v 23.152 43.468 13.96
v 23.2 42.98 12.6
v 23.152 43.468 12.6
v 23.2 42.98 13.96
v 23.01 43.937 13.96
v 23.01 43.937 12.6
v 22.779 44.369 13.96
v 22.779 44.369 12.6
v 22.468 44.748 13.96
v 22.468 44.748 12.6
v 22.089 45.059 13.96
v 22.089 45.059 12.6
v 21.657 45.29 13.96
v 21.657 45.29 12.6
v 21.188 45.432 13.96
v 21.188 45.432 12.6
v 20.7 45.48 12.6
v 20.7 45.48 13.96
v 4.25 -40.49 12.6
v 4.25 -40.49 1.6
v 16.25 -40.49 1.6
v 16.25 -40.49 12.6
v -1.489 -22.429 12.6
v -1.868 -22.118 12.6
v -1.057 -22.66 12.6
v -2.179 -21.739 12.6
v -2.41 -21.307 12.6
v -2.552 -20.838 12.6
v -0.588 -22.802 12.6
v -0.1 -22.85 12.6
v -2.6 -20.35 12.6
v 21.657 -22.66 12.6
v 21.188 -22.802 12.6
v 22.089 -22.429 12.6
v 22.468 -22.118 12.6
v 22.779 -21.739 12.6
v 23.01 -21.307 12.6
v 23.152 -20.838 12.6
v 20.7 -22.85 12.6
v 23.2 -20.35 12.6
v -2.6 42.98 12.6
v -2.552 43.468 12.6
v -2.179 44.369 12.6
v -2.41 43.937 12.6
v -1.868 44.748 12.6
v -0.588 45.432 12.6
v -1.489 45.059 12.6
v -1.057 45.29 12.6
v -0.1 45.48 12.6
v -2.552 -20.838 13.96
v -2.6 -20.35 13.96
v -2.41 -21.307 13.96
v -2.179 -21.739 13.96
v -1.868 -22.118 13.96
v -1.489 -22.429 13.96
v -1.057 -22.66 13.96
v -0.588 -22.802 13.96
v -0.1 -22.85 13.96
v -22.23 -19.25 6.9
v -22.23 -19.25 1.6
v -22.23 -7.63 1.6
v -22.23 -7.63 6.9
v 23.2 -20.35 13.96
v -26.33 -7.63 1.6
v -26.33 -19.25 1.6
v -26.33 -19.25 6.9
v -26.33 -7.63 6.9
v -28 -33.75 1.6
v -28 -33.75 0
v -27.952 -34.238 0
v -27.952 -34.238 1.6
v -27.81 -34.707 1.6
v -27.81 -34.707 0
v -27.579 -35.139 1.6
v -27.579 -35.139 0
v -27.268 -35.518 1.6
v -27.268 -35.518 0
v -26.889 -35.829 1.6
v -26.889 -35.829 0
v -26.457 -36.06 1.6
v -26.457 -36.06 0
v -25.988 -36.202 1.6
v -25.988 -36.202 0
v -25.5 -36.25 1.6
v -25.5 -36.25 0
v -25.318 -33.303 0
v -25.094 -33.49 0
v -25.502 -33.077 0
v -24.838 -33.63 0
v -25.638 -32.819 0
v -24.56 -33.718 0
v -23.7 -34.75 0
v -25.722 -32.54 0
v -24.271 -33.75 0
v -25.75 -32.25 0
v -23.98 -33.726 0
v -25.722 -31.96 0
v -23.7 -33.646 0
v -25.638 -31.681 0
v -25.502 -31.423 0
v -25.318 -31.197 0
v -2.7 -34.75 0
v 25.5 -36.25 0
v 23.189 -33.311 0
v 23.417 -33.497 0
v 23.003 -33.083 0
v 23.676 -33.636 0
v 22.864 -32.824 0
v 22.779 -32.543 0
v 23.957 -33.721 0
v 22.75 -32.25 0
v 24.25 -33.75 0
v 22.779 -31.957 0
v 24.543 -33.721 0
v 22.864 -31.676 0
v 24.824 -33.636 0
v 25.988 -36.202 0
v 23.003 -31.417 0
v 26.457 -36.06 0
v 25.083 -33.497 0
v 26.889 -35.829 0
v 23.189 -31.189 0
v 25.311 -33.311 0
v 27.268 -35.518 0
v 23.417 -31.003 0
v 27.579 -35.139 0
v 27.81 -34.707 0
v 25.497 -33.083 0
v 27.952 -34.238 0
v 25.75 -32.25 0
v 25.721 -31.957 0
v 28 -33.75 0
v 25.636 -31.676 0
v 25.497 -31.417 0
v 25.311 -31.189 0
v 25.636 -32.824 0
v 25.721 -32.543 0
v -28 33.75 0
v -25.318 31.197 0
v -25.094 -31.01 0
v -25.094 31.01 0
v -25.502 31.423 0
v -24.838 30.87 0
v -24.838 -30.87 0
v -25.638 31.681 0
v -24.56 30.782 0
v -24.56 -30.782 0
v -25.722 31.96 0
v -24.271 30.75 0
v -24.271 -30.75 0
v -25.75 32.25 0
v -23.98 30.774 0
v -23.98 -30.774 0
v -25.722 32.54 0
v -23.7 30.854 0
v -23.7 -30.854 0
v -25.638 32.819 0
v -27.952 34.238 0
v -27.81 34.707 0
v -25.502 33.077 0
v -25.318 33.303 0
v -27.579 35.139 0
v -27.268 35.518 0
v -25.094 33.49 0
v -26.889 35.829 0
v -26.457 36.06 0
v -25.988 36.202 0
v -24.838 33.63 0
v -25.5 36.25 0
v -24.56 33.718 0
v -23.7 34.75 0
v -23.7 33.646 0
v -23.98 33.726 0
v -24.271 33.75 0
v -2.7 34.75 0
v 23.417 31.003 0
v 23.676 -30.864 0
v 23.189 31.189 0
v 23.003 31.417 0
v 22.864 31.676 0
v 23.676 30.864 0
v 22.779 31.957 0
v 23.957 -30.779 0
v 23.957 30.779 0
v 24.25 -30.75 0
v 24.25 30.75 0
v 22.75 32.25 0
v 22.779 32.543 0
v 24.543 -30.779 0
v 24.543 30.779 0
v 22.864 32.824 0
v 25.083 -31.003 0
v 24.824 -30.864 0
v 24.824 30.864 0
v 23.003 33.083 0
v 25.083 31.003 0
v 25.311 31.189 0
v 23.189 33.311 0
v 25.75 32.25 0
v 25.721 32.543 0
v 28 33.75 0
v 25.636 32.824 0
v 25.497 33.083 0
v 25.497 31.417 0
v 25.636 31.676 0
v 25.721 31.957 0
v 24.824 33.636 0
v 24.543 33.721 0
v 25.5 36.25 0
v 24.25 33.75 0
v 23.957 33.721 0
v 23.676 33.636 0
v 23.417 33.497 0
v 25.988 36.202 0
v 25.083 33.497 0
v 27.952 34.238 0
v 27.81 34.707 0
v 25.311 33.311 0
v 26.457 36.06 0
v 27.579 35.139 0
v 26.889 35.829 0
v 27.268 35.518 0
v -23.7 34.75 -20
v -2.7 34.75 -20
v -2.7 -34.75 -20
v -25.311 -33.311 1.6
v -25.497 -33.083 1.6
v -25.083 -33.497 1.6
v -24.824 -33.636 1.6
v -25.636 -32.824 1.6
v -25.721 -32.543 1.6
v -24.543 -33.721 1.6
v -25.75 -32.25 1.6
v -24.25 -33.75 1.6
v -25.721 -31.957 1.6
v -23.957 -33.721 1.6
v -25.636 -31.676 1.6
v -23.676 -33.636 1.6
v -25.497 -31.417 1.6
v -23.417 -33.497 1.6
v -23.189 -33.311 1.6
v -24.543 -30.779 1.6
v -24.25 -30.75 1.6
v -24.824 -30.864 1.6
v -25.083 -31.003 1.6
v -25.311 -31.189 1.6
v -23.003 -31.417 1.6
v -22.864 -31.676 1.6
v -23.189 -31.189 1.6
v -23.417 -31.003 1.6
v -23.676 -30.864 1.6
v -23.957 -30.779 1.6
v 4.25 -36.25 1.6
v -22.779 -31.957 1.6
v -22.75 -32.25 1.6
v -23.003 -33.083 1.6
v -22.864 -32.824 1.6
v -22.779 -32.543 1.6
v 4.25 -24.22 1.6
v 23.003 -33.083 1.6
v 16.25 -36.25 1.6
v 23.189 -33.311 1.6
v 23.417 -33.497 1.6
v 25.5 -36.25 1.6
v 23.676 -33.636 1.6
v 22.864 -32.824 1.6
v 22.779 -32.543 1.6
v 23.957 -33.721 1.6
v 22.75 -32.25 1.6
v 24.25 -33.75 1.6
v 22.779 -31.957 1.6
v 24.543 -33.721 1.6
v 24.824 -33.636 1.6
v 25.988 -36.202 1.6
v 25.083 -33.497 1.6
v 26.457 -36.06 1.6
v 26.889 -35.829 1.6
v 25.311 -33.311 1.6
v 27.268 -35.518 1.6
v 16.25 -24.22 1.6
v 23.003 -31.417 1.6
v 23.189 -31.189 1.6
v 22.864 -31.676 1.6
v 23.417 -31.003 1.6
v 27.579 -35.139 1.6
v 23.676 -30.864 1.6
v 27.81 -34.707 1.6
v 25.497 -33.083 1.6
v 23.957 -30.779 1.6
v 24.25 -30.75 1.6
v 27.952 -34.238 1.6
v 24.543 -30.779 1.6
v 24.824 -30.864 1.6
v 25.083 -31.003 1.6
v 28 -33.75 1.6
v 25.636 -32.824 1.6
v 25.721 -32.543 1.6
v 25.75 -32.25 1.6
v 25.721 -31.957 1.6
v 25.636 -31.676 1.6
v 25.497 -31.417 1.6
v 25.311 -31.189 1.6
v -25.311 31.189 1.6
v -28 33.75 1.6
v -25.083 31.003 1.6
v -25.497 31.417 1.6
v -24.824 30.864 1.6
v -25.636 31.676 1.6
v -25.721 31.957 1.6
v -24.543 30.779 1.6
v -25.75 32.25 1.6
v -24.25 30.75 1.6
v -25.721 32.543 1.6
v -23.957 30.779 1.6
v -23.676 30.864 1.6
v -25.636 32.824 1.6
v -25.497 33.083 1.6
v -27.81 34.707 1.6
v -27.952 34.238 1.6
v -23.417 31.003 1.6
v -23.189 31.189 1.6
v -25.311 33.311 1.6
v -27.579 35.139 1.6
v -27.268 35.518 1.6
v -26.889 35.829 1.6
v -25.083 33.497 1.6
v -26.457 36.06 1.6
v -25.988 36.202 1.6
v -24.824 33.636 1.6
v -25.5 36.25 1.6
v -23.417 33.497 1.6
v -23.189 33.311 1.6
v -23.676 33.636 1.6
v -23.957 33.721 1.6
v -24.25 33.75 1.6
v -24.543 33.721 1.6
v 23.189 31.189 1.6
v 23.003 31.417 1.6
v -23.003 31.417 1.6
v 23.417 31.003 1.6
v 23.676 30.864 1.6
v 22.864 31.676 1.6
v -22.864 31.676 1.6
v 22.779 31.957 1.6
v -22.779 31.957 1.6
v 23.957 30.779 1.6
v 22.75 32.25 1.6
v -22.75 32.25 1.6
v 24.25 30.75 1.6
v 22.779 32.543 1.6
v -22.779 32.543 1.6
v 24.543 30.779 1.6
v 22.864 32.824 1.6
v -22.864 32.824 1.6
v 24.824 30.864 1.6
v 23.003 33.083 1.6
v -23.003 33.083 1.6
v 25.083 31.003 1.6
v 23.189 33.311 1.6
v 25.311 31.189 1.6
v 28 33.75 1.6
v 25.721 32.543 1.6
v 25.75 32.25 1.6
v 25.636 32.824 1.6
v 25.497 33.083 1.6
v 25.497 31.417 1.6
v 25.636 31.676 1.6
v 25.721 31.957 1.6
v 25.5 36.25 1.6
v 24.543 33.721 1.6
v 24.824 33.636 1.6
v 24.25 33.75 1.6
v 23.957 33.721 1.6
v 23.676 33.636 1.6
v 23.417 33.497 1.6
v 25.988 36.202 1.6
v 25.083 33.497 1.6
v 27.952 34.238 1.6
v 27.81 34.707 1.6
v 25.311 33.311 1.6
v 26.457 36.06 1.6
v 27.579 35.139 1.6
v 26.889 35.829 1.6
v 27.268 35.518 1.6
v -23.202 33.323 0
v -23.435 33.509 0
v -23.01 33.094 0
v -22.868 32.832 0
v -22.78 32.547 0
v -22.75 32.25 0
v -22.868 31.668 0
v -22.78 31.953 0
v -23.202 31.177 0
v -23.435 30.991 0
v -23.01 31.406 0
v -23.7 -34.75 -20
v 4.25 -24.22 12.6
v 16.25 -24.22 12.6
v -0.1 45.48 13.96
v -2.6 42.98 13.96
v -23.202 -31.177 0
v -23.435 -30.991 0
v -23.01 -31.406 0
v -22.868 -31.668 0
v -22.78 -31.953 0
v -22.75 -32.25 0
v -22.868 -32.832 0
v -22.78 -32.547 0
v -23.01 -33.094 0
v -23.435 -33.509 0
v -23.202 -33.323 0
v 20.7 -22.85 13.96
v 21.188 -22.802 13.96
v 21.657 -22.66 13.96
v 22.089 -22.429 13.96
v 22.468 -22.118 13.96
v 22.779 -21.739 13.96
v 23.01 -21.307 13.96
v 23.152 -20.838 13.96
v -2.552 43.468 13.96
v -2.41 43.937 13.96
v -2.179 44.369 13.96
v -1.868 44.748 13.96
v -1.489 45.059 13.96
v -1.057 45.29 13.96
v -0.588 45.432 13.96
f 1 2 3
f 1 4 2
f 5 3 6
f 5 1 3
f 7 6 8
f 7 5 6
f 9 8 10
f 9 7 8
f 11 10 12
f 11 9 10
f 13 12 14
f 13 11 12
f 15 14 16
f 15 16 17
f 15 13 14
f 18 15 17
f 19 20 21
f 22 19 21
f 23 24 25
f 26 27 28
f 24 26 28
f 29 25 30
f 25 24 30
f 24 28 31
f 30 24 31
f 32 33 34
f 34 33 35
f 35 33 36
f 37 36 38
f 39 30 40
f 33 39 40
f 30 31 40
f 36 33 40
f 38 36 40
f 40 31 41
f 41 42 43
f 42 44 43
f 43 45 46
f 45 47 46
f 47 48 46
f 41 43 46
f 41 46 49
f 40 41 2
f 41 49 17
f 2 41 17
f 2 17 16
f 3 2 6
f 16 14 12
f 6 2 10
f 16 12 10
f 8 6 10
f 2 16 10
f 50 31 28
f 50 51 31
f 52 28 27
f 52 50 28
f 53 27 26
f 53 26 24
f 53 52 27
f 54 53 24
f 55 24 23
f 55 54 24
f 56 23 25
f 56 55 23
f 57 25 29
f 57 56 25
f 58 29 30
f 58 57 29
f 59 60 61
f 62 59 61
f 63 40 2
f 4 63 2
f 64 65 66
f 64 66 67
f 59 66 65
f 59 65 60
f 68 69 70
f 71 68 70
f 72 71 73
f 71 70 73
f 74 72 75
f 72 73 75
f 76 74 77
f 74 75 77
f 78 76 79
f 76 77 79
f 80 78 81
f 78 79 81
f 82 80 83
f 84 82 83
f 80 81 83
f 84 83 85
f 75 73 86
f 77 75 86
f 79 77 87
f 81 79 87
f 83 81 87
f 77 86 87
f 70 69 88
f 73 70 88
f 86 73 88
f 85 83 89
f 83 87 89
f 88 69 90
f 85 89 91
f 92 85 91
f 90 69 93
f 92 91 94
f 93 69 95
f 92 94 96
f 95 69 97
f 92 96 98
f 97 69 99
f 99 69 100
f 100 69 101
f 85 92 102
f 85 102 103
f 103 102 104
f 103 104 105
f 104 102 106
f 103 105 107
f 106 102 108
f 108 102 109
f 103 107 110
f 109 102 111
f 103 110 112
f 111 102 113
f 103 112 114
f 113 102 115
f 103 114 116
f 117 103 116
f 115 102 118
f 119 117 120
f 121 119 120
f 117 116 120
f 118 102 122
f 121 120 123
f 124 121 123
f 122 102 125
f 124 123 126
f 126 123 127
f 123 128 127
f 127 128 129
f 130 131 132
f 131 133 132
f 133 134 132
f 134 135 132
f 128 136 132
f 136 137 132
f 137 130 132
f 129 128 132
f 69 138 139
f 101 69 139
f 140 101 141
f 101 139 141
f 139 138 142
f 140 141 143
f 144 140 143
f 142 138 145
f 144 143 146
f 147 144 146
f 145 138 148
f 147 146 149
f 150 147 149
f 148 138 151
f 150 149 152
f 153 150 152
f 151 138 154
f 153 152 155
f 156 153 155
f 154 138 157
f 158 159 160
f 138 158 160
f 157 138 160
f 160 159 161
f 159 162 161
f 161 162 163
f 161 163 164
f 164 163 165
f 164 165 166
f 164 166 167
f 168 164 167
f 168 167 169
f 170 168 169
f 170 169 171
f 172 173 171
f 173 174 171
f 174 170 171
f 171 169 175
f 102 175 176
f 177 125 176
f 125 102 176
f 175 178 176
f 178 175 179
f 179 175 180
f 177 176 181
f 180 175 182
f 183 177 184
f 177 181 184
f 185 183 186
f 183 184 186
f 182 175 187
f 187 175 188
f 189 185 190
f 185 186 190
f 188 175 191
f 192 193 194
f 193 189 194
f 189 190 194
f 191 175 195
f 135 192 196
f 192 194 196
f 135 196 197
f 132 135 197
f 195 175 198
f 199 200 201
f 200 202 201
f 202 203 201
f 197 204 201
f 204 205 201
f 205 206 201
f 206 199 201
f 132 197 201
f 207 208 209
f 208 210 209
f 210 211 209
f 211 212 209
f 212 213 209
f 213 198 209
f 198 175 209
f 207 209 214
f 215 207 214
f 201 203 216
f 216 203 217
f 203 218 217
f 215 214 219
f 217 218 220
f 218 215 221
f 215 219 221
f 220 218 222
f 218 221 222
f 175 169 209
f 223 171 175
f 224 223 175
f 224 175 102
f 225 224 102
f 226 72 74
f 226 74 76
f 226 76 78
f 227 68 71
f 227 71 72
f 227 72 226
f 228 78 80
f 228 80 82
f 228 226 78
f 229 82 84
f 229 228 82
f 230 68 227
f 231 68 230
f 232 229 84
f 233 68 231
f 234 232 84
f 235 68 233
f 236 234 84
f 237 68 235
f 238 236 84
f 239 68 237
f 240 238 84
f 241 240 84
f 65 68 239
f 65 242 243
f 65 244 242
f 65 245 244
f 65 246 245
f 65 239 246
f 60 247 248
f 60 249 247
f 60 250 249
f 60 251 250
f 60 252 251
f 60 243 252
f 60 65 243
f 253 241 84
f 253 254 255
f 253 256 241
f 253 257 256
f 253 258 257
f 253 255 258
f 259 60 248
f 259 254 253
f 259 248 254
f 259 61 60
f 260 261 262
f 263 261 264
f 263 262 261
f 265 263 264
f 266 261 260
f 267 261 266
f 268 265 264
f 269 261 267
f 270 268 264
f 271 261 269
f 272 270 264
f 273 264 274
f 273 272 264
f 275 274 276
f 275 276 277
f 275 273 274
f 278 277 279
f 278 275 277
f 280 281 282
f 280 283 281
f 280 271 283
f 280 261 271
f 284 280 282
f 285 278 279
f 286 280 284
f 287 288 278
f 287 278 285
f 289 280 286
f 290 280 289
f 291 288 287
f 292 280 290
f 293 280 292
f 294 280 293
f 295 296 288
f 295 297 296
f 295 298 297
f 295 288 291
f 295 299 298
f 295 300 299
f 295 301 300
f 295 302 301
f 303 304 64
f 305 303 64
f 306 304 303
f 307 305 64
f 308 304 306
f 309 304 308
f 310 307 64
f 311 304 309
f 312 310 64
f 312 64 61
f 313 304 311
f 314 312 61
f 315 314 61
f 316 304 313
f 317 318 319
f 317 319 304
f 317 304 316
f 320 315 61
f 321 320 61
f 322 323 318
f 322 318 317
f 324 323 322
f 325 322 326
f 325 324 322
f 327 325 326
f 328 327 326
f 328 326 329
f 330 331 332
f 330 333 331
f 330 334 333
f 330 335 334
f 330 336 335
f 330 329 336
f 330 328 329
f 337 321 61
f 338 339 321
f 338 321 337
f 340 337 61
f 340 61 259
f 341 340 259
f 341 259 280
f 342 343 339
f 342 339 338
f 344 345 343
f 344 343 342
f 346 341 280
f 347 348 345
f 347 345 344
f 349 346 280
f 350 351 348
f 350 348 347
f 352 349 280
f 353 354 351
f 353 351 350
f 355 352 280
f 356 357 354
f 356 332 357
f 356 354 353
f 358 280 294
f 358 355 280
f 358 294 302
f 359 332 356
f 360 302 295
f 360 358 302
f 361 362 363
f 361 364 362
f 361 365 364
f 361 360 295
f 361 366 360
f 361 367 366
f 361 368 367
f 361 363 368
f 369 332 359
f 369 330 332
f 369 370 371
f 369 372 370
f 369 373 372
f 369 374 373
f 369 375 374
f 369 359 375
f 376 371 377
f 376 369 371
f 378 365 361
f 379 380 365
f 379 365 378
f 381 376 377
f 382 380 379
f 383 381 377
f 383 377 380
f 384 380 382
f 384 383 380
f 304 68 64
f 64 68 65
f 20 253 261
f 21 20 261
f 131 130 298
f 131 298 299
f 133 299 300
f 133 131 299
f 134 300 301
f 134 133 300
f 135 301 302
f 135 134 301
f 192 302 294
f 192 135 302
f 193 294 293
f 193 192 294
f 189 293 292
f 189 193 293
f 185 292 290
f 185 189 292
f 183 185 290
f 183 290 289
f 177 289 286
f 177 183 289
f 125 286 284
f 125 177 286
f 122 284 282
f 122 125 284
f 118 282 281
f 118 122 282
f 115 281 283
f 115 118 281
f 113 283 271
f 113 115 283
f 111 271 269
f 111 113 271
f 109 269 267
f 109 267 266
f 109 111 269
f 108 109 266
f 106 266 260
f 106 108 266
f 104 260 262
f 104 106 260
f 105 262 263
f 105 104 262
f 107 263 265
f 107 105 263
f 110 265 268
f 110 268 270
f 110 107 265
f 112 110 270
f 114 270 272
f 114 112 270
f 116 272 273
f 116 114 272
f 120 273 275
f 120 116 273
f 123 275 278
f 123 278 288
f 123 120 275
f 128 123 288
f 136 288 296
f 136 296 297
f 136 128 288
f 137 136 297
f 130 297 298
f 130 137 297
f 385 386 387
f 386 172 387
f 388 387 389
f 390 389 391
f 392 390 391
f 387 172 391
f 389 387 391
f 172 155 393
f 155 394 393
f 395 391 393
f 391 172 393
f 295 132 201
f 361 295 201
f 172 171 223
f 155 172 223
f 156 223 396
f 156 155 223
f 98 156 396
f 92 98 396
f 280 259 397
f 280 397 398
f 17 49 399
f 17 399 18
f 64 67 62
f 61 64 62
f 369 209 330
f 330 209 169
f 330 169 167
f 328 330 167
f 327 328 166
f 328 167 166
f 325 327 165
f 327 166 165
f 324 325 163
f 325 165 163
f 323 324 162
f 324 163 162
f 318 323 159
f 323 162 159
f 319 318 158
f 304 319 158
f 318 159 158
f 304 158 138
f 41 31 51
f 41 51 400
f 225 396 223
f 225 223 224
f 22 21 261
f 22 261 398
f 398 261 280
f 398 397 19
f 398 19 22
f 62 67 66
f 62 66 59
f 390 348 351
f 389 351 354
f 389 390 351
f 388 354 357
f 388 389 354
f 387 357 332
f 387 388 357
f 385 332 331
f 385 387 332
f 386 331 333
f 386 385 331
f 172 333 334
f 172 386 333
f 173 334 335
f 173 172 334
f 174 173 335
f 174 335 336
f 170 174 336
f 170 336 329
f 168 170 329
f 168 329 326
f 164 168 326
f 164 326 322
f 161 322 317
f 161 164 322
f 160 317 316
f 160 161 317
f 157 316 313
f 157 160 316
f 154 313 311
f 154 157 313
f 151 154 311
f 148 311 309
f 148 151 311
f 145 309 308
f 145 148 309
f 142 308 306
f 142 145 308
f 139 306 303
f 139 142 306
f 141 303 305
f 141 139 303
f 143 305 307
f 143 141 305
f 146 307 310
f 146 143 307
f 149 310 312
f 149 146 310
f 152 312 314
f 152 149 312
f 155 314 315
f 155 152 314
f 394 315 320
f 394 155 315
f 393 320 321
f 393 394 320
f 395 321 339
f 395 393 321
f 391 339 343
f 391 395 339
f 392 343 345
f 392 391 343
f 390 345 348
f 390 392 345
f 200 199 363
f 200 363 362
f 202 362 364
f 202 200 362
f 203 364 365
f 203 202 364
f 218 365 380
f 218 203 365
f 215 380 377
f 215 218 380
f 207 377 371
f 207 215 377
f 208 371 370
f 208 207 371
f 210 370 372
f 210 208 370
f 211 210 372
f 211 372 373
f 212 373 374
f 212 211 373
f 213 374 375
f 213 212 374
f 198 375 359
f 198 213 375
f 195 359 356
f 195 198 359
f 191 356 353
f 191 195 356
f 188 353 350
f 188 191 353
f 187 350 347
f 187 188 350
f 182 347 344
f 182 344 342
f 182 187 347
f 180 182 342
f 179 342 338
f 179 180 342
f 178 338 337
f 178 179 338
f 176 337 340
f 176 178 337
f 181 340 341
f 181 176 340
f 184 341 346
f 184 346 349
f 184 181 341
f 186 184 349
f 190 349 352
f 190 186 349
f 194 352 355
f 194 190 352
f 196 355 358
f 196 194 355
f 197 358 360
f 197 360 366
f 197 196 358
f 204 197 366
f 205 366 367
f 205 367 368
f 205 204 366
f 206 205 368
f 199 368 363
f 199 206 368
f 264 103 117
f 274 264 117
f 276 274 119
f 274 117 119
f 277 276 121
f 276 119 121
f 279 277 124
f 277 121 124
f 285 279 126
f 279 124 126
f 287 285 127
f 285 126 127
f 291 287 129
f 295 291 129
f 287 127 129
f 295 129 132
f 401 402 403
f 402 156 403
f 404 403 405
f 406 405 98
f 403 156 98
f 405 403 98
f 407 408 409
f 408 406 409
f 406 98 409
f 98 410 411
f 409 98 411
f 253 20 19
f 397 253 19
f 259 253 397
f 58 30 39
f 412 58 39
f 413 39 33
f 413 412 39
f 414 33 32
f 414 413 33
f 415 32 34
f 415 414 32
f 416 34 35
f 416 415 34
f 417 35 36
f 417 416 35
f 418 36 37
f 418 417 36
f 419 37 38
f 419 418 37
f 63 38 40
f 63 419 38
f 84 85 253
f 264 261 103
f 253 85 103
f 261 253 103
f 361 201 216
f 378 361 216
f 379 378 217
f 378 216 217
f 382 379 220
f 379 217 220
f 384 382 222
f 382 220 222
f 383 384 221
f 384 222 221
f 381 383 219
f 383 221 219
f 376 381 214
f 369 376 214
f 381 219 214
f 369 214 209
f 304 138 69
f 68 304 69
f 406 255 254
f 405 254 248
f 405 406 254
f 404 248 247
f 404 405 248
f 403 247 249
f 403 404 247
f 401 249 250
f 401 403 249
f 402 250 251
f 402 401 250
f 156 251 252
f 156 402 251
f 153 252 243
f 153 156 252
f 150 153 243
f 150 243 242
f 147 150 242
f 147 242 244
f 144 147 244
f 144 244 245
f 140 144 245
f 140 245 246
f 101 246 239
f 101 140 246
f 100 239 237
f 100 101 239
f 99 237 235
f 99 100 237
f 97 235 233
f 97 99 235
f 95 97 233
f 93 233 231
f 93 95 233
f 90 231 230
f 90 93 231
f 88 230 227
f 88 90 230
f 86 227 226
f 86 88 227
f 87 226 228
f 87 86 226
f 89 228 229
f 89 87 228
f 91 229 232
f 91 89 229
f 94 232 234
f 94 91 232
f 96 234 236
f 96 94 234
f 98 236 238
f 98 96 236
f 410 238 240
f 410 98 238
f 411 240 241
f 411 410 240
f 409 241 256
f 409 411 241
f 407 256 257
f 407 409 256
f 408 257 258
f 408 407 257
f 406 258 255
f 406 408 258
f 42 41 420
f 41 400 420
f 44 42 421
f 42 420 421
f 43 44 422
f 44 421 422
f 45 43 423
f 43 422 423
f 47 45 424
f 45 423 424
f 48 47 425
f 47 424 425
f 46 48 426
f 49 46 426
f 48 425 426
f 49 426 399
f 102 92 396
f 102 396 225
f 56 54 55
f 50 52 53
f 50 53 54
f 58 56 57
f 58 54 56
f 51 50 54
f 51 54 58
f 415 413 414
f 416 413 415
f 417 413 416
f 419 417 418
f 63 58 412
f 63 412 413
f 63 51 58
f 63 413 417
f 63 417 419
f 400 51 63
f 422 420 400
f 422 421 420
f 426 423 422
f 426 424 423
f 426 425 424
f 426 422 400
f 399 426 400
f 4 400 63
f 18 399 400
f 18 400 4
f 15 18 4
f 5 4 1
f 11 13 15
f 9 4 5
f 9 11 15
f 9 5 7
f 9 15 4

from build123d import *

# Parameters (mm, degrees)
F0_R      = 1.5
F1_DEPTH  = 1.6
F3_W      = 25.8
F3_H      = 68.33
F4_DEPTH  = 1.36
F5_R      = 2.5
F6_W      = 12
F6_H      = 16.27
F7_DEPTH  = 11
F8_W      = 4.1
F8_H      = 11.62
F9_DEPTH  = 5.3
F10_W     = 21
F10_H     = 69.5
F11_DEPTH = 20


with BuildPart() as f1:
    # F0 (on Top) → F1 (new body)
    with BuildSketch(Plane.XY):
        with BuildLine():
            ThreePointArc((28, 33.75), (27.267767, 35.517767), (25.5, 36.25))
            Line((25.5, 36.25), (-25.5, 36.25))
            ThreePointArc((-25.5, 36.25), (-27.267767, 35.517767), (-28, 33.75))
            Line((-28, 33.75), (-28, -33.75))
            ThreePointArc((-28, -33.75), (-27.267767, -35.517767), (-25.5, -36.25))
            Line((-25.5, -36.25), (25.5, -36.25))
            ThreePointArc((25.5, -36.25), (27.267767, -35.517767), (28, -33.75))
            Line((28, -33.75), (28, 33.75))
        make_face()
        with Locations((-24.25, -32.25)):
            Circle(F0_R, mode=Mode.SUBTRACT)
        with Locations((24.25, -32.25)):
            Circle(F0_R, mode=Mode.SUBTRACT)
        with Locations((-24.25, 32.25)):
            Circle(F0_R, mode=Mode.SUBTRACT)
        with Locations((24.25, 32.25)):
            Circle(F0_R, mode=Mode.SUBTRACT)
    extrude(amount=F1_DEPTH)

    # F6 (on face) → F7 (join)
    with BuildSketch(Plane.XY.offset(1.6)):
        with Locations((10.25, -32.355)):
            Rectangle(F6_W, F6_H)
    extrude(amount=F7_DEPTH)

    # F8 (on face) → F9 (join)
    with BuildSketch(Plane.XY.offset(1.6)):
        with Locations((-24.28, -13.44)):
            Rectangle(F8_W, F8_H)
    extrude(amount=F9_DEPTH)

    # F10 (on face) → F11 (join)
    with BuildSketch(Plane(origin=(0, 0, 0), x_dir=(1, 0, 0), z_dir=(0, 0, -1))):
        with Locations((-13.2, 0)):
            Rectangle(F10_W, F10_H)
    extrude(amount=F11_DEPTH)


with BuildPart() as f4:
    # F3 (on offset) → F4 (new body)
    with BuildSketch(Plane.XY.offset(12.6)):
        with Locations((10.3, 11.315)):
            Rectangle(F3_W, F3_H)
    extrude(amount=F4_DEPTH)

    # F5
    f5_edges = [f4.edges().sort_by_distance(p)[0] for p in [
        (23.2, -22.85, 13.28),
        (-2.6, -22.85, 13.28),
        (23.2, 45.48, 13.28),
        (-2.6, 45.48, 13.28),
    ]]
    fillet(f5_edges, radius=F5_R)


solid = Compound([f1.part, f4.part])
